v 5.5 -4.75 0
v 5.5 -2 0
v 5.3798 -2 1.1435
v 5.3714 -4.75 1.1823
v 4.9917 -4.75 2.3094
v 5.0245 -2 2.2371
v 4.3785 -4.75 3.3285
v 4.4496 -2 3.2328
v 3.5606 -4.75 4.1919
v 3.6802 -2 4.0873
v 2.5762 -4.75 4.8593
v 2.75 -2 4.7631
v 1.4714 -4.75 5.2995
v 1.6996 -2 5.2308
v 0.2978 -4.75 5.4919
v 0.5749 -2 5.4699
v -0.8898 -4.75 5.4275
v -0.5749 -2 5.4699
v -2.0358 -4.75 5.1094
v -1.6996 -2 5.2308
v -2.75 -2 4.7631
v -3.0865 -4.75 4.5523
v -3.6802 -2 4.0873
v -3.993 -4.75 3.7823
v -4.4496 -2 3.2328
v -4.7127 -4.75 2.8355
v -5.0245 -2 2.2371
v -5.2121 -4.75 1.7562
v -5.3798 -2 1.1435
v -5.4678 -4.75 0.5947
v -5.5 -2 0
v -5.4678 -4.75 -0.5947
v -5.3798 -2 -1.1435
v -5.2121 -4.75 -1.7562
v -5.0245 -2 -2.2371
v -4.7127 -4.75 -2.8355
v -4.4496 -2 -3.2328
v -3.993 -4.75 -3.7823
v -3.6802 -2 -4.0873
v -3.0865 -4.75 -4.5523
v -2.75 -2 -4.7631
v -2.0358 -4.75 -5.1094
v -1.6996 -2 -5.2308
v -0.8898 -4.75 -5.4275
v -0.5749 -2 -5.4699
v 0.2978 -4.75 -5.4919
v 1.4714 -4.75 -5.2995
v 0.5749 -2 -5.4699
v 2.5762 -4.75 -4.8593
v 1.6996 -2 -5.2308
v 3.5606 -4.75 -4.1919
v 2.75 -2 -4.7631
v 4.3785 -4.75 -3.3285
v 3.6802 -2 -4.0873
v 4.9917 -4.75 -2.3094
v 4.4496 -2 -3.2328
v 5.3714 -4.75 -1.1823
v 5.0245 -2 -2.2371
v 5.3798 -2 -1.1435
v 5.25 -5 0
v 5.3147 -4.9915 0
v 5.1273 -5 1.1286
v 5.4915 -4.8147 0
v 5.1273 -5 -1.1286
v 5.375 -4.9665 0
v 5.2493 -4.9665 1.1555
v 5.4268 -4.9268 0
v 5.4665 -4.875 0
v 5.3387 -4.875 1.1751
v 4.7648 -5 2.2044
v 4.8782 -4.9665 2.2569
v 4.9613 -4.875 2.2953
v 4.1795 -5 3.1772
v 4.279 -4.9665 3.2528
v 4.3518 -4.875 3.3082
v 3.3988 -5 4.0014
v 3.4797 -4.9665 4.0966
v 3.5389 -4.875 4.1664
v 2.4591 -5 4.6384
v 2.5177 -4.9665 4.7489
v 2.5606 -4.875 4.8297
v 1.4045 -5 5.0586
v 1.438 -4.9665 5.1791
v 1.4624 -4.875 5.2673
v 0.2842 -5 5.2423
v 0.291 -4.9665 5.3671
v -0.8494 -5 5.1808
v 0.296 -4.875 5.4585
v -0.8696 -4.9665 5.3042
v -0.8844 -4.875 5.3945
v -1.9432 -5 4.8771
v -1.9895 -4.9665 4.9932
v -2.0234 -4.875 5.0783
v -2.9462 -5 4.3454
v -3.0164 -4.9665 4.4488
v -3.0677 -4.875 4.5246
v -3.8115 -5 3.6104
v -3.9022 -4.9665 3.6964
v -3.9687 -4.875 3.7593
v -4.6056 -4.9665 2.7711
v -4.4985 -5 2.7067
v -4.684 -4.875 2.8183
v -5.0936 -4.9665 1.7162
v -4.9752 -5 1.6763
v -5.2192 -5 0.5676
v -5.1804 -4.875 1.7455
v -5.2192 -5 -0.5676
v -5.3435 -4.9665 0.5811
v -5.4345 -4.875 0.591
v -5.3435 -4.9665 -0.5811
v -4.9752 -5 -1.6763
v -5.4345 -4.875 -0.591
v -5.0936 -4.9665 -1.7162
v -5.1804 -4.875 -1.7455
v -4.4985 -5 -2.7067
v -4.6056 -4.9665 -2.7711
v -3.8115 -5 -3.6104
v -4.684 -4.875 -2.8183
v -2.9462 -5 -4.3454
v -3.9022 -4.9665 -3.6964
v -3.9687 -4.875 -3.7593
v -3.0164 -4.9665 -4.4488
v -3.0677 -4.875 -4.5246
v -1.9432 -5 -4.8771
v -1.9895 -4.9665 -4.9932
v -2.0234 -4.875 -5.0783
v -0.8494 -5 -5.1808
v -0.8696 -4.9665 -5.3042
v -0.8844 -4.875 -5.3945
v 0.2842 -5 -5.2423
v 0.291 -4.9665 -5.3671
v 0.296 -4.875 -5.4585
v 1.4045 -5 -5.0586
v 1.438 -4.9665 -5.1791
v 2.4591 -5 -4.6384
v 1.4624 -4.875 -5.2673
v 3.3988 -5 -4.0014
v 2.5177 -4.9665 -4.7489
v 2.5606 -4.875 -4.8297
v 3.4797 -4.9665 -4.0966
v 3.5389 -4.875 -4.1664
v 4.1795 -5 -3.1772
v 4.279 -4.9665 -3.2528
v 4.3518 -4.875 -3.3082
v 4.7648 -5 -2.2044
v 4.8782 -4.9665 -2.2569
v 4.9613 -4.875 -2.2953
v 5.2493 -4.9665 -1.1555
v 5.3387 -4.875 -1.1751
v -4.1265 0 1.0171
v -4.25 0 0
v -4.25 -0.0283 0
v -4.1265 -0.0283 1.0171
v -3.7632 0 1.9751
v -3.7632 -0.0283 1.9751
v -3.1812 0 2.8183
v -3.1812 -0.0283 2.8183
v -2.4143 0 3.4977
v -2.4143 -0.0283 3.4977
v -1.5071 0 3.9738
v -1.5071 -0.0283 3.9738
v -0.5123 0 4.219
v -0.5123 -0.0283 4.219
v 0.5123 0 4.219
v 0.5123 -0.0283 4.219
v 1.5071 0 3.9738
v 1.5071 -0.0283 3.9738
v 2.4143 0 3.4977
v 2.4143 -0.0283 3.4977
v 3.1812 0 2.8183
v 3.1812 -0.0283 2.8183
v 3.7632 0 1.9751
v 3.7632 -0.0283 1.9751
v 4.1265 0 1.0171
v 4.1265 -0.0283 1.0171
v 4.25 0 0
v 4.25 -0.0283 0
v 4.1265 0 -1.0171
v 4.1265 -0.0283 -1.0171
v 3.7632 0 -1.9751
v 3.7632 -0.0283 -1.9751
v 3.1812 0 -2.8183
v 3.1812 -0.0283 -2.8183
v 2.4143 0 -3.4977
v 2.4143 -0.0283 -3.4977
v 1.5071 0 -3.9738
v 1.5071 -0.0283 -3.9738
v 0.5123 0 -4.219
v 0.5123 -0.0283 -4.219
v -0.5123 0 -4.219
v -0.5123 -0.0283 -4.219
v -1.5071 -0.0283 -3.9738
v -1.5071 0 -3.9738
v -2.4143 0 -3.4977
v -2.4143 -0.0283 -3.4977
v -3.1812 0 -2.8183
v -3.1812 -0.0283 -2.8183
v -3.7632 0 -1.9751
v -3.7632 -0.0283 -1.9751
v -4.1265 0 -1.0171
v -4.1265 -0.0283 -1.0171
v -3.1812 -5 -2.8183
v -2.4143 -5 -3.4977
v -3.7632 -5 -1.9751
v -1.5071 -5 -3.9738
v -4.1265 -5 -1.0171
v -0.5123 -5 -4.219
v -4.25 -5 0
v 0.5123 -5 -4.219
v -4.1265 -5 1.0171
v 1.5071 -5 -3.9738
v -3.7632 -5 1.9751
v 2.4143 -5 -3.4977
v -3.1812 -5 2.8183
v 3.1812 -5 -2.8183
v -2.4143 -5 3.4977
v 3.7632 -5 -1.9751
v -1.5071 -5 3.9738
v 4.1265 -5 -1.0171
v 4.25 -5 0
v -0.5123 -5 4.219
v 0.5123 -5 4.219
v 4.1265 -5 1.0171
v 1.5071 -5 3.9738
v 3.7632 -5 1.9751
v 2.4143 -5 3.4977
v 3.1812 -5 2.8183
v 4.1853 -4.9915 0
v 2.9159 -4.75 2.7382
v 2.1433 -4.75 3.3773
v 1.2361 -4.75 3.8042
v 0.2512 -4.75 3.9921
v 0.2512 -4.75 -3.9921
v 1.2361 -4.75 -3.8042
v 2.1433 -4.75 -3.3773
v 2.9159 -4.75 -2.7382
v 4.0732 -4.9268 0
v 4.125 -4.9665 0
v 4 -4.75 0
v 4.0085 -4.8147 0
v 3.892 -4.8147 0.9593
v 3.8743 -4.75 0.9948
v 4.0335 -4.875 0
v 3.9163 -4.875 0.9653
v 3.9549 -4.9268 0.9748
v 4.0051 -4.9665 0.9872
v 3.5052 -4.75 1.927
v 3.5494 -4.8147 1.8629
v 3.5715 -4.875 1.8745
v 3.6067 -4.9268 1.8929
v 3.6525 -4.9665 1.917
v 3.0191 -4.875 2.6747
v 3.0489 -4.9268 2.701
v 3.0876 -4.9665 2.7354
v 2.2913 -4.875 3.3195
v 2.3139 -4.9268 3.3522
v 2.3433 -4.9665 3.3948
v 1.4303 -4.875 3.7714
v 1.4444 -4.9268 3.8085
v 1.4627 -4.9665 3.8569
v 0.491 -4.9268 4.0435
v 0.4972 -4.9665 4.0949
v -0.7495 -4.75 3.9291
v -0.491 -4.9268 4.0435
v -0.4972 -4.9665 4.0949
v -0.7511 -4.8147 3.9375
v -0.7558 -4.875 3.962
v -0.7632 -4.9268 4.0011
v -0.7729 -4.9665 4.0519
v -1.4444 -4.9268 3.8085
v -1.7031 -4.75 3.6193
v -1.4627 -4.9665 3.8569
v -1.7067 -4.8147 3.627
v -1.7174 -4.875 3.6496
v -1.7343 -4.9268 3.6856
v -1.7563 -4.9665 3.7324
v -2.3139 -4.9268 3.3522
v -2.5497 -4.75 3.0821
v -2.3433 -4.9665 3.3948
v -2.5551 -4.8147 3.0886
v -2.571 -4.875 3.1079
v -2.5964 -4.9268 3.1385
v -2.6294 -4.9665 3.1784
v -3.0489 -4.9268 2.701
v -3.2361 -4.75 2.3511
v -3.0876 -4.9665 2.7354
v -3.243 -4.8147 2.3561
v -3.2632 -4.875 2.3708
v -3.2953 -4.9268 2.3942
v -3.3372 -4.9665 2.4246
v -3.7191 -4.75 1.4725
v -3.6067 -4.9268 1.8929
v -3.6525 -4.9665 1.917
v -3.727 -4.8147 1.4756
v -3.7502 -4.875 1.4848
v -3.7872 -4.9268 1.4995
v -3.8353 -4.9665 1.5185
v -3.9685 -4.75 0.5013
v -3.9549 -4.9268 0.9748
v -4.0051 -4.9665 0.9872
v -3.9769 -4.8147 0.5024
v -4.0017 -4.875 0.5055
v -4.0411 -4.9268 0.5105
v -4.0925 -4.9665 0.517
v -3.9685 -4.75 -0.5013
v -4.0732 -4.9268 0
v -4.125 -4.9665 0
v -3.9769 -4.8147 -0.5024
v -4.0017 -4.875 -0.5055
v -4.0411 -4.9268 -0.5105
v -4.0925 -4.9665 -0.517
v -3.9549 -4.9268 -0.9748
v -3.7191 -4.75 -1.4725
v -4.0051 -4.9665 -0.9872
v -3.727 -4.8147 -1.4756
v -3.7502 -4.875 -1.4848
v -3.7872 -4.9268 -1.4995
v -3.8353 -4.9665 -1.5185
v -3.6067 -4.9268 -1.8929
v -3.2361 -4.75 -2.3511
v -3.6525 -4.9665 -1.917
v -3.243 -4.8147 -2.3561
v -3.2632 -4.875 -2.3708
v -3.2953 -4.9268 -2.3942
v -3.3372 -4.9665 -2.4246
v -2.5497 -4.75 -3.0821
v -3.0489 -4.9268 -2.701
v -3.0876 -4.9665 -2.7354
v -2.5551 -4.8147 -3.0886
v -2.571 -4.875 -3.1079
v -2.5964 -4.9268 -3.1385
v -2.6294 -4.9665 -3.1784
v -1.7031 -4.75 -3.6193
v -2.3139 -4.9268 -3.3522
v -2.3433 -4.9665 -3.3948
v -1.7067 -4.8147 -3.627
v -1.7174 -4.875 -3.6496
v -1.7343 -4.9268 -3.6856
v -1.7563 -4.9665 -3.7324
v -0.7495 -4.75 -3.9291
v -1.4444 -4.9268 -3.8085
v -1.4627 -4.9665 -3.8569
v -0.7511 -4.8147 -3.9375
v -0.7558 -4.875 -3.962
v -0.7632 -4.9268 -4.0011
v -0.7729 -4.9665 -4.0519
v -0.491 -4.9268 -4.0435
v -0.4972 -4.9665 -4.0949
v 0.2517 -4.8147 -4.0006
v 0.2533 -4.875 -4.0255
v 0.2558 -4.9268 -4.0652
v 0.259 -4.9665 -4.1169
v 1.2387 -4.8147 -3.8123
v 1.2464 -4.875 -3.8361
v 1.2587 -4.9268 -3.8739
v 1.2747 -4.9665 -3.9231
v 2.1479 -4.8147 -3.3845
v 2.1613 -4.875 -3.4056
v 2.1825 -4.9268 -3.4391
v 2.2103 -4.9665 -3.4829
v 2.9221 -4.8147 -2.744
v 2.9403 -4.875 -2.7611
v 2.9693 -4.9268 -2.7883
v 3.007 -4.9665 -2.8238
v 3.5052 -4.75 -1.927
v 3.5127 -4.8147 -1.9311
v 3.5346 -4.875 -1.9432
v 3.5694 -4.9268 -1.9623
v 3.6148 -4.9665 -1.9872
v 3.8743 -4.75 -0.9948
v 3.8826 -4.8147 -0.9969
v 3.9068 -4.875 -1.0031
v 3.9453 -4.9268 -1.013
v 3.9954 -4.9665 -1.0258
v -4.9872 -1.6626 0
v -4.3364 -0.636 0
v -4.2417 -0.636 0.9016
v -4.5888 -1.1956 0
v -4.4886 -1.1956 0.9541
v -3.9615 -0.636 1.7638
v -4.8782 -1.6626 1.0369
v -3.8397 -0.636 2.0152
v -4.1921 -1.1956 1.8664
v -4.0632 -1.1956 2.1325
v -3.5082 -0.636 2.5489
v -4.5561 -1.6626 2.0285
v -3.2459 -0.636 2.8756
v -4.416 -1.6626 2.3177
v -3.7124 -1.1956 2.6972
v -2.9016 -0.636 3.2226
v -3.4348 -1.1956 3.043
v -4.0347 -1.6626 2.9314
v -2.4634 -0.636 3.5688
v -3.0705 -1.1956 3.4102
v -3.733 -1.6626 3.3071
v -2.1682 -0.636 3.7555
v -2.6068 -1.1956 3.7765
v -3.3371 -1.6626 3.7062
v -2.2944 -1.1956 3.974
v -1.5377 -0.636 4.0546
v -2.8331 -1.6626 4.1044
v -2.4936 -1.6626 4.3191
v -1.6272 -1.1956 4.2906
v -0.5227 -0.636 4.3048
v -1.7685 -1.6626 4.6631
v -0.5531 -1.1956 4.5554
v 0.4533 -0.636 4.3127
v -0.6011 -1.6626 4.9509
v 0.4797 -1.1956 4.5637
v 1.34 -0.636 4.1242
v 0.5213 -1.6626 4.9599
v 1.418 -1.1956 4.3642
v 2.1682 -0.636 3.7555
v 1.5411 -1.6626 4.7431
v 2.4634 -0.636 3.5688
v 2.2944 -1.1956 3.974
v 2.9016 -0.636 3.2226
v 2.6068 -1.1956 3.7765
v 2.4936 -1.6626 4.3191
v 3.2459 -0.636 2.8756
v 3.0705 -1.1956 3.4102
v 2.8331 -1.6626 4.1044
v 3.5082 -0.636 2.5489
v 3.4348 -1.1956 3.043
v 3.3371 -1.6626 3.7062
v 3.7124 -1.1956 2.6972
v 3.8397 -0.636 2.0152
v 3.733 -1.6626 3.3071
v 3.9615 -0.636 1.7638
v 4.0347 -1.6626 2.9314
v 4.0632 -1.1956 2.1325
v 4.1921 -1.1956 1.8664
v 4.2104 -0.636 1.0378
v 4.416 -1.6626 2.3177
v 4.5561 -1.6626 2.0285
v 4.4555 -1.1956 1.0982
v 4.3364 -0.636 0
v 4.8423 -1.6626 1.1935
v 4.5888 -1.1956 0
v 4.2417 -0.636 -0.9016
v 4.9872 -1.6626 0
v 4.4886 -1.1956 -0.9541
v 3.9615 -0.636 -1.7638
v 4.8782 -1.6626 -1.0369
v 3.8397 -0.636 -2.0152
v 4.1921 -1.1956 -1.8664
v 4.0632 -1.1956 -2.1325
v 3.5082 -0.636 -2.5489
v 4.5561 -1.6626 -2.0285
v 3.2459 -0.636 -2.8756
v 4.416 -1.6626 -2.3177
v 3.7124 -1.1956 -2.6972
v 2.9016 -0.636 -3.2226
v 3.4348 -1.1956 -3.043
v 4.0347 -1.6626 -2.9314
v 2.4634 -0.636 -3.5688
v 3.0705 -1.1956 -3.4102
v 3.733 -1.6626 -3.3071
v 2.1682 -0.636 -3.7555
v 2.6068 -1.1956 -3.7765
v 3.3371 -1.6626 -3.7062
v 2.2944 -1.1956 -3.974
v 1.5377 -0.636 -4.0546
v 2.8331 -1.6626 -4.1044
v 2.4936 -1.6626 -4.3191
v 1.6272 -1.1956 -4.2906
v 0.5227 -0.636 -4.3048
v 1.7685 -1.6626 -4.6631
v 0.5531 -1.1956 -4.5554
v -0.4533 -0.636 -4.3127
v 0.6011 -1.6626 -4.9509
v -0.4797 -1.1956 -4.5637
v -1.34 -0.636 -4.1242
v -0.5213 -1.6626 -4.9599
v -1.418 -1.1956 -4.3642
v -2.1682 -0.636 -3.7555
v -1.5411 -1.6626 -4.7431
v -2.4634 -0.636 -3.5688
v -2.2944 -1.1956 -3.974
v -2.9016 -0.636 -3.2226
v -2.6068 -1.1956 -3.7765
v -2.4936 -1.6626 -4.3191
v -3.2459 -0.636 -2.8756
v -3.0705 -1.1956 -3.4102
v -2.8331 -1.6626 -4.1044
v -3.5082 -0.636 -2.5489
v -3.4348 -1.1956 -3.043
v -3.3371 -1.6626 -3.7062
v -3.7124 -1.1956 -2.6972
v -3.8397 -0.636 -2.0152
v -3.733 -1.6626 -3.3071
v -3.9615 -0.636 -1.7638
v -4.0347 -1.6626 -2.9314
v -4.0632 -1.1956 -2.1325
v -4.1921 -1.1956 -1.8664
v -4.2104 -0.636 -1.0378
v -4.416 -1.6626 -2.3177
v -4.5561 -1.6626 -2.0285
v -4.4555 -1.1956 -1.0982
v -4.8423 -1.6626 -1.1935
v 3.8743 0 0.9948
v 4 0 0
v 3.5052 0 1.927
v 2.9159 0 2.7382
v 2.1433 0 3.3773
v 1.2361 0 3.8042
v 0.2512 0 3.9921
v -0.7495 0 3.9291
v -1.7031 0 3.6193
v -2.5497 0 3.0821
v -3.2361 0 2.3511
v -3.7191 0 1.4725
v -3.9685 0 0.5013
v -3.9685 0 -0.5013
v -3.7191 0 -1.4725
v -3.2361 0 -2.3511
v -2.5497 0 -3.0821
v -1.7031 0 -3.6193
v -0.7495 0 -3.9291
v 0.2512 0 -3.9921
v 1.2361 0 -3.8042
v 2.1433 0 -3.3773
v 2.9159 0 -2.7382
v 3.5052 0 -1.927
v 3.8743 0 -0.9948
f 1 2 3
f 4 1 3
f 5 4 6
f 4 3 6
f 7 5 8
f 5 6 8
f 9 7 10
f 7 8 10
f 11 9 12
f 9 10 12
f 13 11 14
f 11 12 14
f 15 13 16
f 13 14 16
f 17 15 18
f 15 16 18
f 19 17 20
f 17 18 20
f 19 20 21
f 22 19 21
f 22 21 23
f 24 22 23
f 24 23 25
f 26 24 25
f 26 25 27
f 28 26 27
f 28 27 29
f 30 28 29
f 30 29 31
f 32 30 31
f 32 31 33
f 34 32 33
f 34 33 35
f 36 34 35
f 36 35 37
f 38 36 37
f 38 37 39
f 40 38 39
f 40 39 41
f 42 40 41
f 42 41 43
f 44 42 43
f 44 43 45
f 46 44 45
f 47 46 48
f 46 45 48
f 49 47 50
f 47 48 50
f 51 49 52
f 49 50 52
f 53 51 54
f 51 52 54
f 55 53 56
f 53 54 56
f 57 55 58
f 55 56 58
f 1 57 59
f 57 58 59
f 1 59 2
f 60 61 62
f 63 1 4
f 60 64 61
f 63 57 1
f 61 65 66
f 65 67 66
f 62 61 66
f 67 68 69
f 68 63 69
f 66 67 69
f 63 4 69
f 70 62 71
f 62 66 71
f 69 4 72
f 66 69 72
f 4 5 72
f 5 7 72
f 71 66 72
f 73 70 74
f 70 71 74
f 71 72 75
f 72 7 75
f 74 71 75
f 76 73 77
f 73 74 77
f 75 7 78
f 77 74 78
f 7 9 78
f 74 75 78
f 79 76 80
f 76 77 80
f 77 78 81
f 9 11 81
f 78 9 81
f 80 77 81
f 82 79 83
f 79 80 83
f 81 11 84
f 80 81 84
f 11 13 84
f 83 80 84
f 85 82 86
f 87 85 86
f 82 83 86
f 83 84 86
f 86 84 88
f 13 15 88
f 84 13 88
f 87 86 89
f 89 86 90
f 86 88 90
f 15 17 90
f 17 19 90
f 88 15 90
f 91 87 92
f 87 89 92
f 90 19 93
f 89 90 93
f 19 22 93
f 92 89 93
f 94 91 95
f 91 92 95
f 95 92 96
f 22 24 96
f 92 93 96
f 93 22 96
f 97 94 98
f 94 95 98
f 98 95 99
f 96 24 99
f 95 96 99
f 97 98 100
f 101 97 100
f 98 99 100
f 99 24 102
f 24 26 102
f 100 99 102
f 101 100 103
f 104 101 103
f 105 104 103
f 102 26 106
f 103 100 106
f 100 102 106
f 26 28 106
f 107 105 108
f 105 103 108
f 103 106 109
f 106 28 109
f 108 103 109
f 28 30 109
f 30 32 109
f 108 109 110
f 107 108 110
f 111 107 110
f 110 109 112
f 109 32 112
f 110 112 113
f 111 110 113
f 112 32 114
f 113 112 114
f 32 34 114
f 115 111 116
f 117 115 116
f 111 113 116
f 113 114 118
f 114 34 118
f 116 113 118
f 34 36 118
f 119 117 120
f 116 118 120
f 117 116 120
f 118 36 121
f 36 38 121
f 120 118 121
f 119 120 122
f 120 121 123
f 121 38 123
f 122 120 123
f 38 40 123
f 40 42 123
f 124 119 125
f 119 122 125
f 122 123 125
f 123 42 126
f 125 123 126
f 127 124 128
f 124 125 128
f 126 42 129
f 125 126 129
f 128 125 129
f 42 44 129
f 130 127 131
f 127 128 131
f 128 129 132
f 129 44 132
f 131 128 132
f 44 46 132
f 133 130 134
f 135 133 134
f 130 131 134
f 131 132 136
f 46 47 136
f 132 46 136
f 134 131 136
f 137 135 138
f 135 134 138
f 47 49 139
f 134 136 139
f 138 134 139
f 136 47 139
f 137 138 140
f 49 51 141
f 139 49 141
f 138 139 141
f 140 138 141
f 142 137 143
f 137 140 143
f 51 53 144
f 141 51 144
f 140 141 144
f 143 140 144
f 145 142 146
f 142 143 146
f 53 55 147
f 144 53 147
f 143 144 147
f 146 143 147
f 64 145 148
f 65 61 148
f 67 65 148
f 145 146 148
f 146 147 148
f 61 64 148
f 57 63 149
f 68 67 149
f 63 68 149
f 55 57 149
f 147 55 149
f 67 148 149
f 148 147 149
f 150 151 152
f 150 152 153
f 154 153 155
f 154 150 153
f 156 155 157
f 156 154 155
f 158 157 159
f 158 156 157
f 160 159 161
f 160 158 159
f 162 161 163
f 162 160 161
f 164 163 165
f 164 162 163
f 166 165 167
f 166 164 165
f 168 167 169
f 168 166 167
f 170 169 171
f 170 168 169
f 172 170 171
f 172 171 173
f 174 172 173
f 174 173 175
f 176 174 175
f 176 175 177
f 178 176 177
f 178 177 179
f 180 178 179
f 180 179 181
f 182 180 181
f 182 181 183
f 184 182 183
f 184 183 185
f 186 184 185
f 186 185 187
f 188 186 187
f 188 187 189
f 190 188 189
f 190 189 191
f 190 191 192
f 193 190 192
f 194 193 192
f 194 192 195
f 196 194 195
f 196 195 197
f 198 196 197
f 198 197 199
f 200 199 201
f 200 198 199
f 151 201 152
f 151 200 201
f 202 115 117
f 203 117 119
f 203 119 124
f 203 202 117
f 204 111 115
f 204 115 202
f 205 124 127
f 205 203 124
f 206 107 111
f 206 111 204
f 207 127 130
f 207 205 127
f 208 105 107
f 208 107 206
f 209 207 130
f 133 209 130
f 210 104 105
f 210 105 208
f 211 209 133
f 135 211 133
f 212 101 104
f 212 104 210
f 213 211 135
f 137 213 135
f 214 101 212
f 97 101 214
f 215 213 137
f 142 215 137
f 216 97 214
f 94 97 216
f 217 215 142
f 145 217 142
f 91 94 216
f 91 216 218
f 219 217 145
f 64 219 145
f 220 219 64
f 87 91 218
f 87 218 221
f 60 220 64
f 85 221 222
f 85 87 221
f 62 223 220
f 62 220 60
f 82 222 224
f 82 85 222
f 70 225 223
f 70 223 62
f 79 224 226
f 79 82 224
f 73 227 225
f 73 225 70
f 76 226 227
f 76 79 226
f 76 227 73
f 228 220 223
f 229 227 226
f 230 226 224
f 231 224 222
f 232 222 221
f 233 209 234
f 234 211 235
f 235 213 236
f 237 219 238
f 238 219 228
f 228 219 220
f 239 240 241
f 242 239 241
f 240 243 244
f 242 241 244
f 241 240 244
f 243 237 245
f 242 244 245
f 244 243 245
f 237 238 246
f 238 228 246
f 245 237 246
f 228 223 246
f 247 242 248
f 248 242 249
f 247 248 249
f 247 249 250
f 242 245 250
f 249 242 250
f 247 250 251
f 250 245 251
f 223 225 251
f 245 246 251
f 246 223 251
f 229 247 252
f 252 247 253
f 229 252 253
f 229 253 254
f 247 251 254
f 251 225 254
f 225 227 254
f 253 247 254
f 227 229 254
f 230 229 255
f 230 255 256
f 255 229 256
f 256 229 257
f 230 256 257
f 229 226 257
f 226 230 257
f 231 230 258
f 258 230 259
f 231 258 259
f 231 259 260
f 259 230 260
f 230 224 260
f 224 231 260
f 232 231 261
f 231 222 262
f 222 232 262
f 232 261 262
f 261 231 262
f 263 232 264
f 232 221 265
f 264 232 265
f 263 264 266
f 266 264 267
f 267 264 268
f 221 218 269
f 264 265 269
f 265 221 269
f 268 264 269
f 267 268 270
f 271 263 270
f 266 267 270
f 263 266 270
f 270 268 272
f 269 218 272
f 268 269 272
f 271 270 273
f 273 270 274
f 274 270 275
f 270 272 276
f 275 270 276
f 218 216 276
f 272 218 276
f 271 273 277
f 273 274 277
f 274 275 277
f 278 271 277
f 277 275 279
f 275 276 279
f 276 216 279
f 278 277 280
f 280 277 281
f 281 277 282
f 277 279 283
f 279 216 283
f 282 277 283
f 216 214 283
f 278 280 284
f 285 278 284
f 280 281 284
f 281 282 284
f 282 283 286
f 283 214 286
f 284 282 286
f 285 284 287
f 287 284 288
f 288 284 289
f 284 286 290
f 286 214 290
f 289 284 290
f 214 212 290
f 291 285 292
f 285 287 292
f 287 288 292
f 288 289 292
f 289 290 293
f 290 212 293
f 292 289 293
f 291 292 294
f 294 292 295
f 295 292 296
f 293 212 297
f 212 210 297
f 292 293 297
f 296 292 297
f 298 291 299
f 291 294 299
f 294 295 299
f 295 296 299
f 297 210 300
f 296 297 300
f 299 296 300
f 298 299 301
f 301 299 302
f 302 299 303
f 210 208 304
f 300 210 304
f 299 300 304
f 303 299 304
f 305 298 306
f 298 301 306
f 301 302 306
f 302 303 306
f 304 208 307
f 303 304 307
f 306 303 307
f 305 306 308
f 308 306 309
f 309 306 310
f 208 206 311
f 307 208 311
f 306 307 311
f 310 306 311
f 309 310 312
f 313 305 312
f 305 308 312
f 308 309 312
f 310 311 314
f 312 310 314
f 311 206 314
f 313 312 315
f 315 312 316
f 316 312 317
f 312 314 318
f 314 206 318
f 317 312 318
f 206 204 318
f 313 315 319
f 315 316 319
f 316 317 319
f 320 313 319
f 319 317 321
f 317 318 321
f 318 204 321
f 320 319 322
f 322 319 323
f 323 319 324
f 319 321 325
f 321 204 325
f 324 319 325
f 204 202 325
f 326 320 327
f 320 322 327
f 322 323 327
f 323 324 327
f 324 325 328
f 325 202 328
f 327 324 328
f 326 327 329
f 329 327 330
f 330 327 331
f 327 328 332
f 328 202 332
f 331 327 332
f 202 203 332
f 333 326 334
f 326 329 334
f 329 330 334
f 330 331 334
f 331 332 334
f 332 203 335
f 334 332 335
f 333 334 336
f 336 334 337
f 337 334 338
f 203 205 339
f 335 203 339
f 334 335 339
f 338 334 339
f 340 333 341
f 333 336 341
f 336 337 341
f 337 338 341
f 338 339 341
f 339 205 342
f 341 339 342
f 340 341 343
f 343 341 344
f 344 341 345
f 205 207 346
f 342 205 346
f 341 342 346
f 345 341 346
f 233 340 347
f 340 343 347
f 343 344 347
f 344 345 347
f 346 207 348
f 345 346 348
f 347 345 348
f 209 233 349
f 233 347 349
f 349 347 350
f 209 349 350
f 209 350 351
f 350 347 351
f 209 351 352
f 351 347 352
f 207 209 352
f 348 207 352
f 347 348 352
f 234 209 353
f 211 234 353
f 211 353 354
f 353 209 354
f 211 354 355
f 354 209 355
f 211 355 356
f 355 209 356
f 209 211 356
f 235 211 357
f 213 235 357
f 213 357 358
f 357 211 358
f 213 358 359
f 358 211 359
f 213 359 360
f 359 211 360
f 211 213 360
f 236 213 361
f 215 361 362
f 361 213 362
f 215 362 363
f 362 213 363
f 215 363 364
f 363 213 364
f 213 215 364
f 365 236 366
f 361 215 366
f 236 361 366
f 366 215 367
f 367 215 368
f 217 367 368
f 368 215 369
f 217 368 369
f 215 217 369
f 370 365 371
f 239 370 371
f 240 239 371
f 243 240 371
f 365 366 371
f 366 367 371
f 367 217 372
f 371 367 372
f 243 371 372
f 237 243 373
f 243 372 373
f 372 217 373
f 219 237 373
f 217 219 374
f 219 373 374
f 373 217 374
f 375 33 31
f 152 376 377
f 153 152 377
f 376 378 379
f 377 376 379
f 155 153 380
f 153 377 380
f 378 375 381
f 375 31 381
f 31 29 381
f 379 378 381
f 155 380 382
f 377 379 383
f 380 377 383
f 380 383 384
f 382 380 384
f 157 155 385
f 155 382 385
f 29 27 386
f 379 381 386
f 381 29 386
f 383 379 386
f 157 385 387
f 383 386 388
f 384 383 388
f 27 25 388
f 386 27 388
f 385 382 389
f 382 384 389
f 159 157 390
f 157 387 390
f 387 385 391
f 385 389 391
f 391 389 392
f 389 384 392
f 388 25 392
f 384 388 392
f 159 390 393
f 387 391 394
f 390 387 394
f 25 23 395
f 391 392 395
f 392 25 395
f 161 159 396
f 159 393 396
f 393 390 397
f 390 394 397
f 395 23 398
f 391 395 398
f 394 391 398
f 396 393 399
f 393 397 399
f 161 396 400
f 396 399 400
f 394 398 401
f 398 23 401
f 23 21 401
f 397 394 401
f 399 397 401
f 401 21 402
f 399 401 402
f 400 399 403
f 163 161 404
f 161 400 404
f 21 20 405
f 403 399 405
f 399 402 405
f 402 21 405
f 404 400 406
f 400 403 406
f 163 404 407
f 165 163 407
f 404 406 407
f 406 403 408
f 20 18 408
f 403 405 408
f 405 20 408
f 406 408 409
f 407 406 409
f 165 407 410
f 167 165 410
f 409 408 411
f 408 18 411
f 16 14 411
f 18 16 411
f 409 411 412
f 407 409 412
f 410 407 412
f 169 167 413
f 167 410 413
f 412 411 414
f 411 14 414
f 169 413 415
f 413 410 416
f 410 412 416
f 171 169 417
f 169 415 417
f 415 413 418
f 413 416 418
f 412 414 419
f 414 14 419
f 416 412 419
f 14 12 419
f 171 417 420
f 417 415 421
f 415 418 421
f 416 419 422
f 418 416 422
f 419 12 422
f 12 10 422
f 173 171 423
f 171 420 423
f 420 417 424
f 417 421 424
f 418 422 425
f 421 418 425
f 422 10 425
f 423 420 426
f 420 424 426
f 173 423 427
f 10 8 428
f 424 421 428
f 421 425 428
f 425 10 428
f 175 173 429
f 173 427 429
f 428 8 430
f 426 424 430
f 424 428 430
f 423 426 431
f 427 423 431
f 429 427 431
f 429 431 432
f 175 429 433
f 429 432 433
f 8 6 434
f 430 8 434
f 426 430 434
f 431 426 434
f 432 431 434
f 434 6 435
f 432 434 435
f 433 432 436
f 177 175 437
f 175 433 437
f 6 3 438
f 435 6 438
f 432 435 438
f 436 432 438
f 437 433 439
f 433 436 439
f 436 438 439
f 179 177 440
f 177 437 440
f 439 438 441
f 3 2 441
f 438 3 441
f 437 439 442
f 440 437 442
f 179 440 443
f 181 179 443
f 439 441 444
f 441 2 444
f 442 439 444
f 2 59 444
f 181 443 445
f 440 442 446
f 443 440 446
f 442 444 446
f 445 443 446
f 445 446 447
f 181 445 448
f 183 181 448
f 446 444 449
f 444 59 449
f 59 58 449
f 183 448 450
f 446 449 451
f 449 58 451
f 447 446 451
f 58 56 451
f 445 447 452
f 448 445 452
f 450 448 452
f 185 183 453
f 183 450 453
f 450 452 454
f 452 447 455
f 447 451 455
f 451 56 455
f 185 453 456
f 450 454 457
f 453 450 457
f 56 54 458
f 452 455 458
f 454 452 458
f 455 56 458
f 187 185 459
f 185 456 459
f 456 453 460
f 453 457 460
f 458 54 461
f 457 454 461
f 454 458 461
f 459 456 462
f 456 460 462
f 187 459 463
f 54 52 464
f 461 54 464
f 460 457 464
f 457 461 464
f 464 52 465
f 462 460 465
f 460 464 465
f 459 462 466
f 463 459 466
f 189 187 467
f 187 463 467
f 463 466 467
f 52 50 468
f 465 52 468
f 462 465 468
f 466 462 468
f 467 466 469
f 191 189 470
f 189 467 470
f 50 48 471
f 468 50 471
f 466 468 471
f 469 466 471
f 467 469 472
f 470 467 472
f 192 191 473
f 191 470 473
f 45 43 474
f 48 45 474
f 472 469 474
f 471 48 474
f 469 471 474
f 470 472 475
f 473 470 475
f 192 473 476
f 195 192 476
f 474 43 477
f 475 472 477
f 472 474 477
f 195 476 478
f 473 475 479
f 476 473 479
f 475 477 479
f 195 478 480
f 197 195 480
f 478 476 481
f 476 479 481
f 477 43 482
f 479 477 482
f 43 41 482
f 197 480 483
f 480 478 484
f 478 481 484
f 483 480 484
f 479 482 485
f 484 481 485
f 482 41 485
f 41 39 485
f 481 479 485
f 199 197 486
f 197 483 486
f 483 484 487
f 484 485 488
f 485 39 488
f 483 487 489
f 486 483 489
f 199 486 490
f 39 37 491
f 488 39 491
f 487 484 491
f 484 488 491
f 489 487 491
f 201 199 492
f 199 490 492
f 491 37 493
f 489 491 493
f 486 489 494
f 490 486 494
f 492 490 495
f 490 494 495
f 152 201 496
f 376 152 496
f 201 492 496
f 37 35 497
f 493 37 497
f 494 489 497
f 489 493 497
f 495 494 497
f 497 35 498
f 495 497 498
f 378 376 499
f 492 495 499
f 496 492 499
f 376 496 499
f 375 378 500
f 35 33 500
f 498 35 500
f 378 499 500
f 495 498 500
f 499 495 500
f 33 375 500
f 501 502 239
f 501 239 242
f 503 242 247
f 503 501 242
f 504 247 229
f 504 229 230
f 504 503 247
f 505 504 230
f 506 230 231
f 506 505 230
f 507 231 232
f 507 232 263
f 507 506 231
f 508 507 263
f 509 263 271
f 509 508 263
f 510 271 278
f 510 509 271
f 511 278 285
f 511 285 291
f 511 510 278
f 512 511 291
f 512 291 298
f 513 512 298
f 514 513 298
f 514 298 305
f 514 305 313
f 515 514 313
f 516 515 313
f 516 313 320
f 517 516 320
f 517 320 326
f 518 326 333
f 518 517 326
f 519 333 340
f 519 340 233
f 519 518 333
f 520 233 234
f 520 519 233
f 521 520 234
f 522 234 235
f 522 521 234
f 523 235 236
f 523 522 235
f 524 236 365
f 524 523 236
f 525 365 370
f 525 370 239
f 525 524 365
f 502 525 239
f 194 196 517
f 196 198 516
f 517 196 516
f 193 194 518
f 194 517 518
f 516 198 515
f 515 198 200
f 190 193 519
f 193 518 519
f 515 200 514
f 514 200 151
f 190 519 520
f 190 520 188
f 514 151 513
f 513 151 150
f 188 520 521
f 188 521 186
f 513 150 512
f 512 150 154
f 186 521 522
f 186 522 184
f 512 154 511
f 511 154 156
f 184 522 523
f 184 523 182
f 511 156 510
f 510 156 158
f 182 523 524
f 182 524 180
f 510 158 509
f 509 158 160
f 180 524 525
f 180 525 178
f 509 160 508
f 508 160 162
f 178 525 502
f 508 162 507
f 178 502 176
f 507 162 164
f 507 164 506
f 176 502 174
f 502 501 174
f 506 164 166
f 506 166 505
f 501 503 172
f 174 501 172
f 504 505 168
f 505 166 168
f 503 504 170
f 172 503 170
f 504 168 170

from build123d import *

# Parameters (mm, degrees)
F0_R     = 5.5
F0_R_2   = 4
F4_DEPTH = 5
F5_R     = 0.25
F6_R     = 0.25
F1_R     = 5.5
F1_R_2   = 4.25
F2_DEPTH = 2


# Not quite as in the source:
# - a fillet or chamfer that OpenCascade refuses, or shapes differently, is made with other operations: its cross-section is extruded or revolved along the edge and cut away or added


with BuildPart() as f4:
    # F0 (on Front) → F4 (new body)
    with BuildSketch(Plane.XZ):
        Circle(F0_R)
        Circle(F0_R_2, mode=Mode.SUBTRACT)
    extrude(amount=F4_DEPTH)

    # F5
    f5_edges = [f4.edges().sort_by_distance(p)[0] for p in [
        (-4, -5, 0),
    ]]
    fillet(f5_edges, radius=F5_R)

    # F6
    f6_edges = [f4.edges().sort_by_distance(p)[0] for p in [
        (-5.5, -5, 0),
    ]]
    fillet(f6_edges, radius=F6_R)

    # F1 (on face) → F2 (cut)
    with BuildSketch(Plane(origin=(0, 0, 0), x_dir=(-1, 0, 0), z_dir=(0, 1, 0))):
        Circle(F1_R)
        Circle(F1_R_2, mode=Mode.SUBTRACT)
    extrude(amount=-F2_DEPTH, mode=Mode.SUBTRACT)

    # F3: fillet of radius 2.18 on 1 edges, made by hand

    # F3_s1 → F3_t2 (revolve)
    with BuildSketch(Plane.XY):
        with BuildLine():
            ThreePointArc((-4.25, -0.0283255847), (-4.5888318925, -1.1955873377), (-5.5, -2))
            Line((-5.5, -2), (-5.4814, -2.0394334883))
            ThreePointArc((-5.4814, -2.0394334883), (-4.875, -2.0436), (-4.25, -2.0436))
            Line((-4.25, -2.0436), (-4.2064, -2))
            Line((-4.2064, -2), (-4.2064, -0.0283255847))
            Line((-4.2064, -0.0283255847), (-4.25, -0.0283255847))
        make_face()
    revolve(axis=Axis((0, -2, 0), (0, 1, 0)))


solid = f4.part
